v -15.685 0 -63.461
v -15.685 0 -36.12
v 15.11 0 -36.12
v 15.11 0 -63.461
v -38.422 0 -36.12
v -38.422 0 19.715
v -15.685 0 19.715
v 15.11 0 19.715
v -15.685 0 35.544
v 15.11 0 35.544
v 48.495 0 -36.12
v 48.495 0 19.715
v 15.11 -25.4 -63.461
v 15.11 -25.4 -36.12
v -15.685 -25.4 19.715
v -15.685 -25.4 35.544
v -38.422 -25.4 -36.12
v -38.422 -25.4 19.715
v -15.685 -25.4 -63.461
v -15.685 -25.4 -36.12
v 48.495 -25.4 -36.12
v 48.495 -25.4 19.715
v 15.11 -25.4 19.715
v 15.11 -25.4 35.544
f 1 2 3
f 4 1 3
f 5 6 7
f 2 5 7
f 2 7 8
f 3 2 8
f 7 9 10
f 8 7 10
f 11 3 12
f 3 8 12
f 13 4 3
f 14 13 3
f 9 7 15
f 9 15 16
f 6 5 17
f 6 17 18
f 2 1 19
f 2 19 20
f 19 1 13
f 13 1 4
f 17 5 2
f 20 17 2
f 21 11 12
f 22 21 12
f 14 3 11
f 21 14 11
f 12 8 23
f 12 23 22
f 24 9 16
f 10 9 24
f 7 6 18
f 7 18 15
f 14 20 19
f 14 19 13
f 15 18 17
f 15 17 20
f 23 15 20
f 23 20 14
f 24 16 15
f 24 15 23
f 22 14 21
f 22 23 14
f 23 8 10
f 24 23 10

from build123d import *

# Parameters (mm, degrees)
F0_W     = 86.91734
F0_H     = 55.834315
F1_DEPTH = 25.4
F2_DEPTH = 25.4
F3_W     = 30.795218
F3_H     = 99.005182
F4_DEPTH = 25.4


with BuildPart() as f1:
    # F0 (on Front) → F1 (new body)
    with BuildSketch(Plane.XZ):
        with Locations((5.0366, -8.202463)):
            Rectangle(F0_W, F0_H)
    extrude(amount=F1_DEPTH)

    # F0 (on Front) → F2 (join)
    with BuildSketch(Plane.XZ):
        with Locations((5.0366, -8.202463)):
            Rectangle(F0_W, F0_H)
    extrude(amount=F2_DEPTH)

    # F3 (on Front) → F4 (join)
    with BuildSketch(Plane.XZ):
        with Locations((-0.287806, -13.958579)):
            Rectangle(F3_W, F3_H)
    extrude(amount=F4_DEPTH)


solid = f1.part
